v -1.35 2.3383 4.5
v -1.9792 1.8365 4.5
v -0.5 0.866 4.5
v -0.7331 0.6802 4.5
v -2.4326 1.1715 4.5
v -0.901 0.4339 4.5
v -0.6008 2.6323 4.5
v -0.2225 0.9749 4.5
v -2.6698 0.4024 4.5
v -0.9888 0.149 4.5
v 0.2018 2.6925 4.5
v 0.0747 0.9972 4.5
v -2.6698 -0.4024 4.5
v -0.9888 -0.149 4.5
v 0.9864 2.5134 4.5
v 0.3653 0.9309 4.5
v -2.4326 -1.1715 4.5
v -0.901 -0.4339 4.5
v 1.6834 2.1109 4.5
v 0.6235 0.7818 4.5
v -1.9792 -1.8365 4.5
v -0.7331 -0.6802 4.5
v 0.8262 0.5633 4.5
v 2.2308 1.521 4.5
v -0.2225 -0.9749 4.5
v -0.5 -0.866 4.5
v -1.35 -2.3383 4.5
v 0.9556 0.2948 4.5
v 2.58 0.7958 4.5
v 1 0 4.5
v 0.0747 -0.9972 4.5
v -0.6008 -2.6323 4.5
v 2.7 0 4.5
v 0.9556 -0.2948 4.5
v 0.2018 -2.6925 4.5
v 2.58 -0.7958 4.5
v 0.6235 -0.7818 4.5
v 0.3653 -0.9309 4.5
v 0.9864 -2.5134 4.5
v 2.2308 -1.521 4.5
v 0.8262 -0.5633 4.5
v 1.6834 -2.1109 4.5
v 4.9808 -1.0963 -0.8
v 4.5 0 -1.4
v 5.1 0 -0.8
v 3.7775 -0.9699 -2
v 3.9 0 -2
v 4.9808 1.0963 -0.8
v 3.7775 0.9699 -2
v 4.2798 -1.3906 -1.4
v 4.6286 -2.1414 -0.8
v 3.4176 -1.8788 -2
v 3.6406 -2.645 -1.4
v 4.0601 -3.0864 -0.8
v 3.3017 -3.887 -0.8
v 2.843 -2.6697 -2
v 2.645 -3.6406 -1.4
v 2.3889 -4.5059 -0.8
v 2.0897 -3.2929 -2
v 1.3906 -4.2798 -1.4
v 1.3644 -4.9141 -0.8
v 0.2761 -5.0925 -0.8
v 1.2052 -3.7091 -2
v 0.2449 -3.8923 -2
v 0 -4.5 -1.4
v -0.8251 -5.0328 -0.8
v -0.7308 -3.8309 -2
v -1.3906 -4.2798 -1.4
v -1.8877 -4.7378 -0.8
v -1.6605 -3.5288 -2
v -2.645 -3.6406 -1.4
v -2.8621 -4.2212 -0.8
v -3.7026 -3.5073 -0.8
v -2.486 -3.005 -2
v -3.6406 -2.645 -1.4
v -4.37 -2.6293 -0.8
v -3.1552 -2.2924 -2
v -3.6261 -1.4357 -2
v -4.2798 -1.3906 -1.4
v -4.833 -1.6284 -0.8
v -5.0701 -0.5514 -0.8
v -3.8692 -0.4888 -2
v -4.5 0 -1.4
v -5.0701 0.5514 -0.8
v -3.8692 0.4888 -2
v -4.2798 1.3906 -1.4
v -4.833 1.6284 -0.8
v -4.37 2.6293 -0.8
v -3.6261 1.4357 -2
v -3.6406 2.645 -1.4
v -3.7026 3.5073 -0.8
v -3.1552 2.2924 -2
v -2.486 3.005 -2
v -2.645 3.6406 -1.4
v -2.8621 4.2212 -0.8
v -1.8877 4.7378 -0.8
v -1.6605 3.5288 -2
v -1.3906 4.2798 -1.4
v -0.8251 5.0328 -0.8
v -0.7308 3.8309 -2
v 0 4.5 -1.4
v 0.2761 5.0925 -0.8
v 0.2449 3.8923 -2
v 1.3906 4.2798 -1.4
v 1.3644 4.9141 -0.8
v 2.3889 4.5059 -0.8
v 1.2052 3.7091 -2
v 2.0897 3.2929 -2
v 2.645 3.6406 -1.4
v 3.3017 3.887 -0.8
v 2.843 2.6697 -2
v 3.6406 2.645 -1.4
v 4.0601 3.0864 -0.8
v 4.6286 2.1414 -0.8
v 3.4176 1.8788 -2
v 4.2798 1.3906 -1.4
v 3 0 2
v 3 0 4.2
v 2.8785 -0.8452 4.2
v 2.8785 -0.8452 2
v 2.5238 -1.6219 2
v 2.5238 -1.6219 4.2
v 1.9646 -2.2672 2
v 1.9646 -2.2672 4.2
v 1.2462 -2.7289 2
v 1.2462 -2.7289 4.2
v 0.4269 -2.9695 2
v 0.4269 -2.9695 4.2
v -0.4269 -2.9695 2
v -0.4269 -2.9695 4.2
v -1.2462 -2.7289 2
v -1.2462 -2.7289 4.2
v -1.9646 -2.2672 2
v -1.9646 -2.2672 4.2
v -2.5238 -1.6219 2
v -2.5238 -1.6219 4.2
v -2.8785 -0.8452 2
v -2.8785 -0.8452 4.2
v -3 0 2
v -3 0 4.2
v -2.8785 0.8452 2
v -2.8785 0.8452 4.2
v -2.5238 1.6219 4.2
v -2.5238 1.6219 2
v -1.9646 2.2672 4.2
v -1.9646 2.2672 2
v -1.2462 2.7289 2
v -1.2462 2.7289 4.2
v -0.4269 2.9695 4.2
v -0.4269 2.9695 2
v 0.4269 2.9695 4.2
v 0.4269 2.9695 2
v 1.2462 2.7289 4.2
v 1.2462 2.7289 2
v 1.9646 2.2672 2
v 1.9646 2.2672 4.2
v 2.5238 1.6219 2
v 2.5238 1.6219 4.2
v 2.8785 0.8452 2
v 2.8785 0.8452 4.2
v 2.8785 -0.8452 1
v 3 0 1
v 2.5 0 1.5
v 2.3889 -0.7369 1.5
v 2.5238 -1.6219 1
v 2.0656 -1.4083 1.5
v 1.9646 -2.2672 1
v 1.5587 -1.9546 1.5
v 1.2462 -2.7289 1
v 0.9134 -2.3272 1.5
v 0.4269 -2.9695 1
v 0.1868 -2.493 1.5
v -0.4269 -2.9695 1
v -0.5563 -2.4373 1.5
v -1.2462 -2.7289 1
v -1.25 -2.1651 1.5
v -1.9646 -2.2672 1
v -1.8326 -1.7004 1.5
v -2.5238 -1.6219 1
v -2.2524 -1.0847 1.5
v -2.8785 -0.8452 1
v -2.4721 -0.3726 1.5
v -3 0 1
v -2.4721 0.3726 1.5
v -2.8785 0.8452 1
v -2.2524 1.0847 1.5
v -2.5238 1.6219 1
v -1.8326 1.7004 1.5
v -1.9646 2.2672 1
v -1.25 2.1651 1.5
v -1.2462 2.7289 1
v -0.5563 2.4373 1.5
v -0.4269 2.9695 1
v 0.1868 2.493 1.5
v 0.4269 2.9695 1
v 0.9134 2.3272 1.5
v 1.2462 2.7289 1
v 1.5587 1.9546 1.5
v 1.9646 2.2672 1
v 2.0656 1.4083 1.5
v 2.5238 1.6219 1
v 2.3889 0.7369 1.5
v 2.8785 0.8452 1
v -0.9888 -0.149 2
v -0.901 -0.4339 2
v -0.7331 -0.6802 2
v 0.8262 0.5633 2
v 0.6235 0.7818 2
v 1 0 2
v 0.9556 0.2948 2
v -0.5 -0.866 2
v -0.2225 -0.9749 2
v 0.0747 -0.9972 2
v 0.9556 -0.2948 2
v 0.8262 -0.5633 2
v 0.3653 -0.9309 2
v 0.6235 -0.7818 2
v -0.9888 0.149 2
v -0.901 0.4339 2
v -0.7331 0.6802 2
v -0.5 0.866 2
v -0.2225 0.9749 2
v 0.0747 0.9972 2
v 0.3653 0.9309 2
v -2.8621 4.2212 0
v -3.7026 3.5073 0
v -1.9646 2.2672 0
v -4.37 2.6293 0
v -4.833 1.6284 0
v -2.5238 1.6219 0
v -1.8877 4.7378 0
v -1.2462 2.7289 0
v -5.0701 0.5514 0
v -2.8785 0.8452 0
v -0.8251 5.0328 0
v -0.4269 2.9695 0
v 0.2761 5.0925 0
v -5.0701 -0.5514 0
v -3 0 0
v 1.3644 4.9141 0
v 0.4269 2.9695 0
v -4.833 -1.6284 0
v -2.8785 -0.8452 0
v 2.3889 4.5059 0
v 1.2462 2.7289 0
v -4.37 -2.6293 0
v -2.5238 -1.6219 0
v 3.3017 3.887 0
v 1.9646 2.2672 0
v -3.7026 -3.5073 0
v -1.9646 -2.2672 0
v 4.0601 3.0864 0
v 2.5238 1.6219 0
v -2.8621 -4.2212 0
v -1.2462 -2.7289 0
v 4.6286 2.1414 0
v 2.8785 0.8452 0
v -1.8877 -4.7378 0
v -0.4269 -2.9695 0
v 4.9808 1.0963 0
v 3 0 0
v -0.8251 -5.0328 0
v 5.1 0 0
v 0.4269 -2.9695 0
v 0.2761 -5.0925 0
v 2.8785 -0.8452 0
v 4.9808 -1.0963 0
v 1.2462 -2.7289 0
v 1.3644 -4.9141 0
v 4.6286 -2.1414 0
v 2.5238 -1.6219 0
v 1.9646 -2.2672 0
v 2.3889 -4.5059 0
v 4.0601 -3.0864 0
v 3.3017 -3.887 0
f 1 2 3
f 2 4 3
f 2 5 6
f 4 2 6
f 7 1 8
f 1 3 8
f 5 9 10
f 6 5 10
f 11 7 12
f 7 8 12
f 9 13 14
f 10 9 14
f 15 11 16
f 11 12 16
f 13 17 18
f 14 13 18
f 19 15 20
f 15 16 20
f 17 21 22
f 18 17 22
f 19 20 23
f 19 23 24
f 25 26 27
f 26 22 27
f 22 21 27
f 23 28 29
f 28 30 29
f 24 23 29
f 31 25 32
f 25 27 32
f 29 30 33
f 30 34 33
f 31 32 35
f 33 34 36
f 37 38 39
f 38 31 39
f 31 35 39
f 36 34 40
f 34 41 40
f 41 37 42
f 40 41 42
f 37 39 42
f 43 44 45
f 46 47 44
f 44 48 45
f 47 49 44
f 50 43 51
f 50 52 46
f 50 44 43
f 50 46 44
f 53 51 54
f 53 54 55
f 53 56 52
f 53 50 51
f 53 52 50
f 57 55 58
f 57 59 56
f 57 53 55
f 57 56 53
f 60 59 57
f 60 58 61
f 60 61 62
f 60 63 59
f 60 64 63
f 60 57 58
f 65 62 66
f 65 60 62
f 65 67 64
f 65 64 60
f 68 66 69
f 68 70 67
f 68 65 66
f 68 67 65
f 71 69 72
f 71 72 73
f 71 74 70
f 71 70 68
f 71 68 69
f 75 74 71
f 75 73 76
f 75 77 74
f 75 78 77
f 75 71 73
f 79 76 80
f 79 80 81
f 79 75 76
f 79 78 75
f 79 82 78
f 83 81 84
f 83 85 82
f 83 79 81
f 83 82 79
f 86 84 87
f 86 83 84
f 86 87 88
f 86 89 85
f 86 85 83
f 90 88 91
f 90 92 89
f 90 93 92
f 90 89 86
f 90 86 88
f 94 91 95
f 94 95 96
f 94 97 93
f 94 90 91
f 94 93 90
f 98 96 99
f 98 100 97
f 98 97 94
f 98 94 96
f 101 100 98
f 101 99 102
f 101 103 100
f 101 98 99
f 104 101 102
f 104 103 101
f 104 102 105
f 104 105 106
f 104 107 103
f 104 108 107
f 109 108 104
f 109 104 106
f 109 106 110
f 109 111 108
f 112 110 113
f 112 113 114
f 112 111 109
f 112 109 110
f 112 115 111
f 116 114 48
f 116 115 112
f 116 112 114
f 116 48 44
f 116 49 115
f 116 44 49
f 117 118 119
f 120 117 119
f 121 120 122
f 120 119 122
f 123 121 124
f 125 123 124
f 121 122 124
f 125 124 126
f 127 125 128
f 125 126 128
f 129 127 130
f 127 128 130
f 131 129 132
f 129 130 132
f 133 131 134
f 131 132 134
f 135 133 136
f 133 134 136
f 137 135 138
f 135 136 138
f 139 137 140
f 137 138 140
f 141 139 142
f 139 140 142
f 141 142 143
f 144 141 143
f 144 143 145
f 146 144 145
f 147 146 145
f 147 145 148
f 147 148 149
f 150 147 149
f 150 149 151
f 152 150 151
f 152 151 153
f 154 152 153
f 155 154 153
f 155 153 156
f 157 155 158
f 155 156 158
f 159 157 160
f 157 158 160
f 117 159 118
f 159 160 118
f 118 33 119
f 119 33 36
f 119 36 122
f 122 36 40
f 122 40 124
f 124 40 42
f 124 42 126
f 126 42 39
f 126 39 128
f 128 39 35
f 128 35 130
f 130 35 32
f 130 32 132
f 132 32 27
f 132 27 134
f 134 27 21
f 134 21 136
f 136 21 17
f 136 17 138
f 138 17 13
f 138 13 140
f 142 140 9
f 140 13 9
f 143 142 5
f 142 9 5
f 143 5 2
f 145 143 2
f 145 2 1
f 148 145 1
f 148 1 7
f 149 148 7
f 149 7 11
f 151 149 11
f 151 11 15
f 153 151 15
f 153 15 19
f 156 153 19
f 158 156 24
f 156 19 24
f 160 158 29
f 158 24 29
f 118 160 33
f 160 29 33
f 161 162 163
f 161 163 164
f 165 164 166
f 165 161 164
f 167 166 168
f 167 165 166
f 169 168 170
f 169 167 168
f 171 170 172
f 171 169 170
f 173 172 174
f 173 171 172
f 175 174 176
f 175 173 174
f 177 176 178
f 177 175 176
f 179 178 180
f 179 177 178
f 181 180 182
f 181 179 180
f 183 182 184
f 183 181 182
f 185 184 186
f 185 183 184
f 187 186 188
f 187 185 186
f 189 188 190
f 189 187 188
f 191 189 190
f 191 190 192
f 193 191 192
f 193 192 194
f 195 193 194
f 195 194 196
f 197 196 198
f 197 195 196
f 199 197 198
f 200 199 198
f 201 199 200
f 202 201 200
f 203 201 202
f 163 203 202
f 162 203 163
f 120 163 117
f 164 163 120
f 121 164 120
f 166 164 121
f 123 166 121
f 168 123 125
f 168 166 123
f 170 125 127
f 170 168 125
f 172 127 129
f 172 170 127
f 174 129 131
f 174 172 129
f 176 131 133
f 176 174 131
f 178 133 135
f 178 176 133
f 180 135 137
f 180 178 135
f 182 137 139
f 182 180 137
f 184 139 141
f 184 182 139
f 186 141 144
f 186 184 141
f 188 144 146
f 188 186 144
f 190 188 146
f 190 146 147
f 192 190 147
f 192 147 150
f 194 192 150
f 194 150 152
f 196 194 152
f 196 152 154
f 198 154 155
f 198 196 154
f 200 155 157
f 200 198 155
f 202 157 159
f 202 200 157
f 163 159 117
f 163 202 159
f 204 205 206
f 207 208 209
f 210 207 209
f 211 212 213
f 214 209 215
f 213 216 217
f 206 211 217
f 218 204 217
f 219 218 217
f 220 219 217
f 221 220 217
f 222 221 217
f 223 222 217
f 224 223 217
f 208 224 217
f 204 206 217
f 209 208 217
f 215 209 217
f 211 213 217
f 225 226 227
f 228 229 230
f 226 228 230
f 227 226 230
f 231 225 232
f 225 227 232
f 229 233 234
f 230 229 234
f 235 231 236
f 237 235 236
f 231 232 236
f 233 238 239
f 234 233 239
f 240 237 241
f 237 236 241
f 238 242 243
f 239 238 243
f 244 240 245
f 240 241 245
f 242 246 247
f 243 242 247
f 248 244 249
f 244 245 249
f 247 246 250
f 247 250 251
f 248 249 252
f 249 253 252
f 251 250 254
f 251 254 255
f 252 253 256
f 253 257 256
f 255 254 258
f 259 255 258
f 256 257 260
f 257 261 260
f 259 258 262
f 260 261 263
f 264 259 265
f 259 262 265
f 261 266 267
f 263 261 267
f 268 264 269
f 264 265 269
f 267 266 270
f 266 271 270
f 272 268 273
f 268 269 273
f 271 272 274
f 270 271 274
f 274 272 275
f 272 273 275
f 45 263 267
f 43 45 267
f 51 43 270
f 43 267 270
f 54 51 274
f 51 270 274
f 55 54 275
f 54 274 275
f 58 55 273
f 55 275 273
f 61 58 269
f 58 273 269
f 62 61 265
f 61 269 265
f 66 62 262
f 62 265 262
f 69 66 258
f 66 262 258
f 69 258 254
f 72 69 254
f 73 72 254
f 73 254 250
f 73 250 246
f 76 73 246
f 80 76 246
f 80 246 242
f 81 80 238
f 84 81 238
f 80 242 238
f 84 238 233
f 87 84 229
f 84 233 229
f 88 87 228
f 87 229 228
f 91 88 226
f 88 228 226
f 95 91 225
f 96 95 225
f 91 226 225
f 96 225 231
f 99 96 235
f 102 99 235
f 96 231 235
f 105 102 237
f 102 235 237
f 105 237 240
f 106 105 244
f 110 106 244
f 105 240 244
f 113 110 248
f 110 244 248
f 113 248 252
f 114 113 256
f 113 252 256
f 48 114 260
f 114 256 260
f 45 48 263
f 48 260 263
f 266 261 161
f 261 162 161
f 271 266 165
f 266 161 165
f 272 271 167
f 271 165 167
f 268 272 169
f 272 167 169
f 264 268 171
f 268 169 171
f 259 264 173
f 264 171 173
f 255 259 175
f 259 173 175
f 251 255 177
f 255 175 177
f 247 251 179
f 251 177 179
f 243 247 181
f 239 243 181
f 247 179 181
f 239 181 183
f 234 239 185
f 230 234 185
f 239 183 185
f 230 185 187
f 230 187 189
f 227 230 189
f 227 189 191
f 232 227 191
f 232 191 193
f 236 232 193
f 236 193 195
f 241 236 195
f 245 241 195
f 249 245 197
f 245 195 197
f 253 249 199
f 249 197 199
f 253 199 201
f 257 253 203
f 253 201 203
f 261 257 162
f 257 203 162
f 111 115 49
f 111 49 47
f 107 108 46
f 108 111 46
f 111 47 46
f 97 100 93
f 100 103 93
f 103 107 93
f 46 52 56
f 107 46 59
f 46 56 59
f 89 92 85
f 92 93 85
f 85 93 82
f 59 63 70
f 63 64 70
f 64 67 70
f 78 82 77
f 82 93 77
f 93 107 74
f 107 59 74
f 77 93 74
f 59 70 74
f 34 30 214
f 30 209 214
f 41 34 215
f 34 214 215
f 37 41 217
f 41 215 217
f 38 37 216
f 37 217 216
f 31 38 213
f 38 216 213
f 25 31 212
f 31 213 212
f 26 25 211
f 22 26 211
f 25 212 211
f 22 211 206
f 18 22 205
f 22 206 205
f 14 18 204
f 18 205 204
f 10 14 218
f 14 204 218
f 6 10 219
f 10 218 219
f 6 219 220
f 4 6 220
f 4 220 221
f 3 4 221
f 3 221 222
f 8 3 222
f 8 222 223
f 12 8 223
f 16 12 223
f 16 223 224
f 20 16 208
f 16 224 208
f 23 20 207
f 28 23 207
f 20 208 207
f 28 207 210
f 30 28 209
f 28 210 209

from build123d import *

# Parameters (mm, degrees)
F2_SIZE = 0.3
F3_SIZE = 0.49999
F4_SIZE = 1.2


# Not quite as in the source:
# - a fillet or chamfer is up to 0.001 mm smaller than in the source, because OpenCascade refuses the exact size


with BuildPart() as f1:
    # F0 (on Front) → F1 (revolve)
    with BuildSketch(Plane.XZ):
        Polygon((5.1, -2), (5.1, 0), (3, 0), (3, 1), (2.5, 1), (2.5, 2), (3, 2), (3, 4.5), (1, 4.5), (1, 2), (0, 2), (0, 0), (0, -2), align=None)
    revolve(axis=Axis((0, 0, -1), (0, 0, -1)))

    # F2
    f2_edges = [f1.edges().sort_by_distance(p)[0] for p in [
        (-3, 0, 4.5),
    ]]
    chamfer(f2_edges, length=F2_SIZE)

    # F3 (size 0.5 in the source; OpenCascade refuses exactly that, so slightly less here)
    f3_edges = [f1.edges().sort_by_distance(p)[0] for p in [
        (-2.5, 0, 2),
        (-2.5, 0, 1),
    ]]
    chamfer(f3_edges, length=F3_SIZE)

    # F4
    f4_edges = [f1.edges().sort_by_distance(p)[0] for p in [
        (-5.1, 0, -2),
    ]]
    chamfer(f4_edges, length=F4_SIZE)


solid = f1.part
